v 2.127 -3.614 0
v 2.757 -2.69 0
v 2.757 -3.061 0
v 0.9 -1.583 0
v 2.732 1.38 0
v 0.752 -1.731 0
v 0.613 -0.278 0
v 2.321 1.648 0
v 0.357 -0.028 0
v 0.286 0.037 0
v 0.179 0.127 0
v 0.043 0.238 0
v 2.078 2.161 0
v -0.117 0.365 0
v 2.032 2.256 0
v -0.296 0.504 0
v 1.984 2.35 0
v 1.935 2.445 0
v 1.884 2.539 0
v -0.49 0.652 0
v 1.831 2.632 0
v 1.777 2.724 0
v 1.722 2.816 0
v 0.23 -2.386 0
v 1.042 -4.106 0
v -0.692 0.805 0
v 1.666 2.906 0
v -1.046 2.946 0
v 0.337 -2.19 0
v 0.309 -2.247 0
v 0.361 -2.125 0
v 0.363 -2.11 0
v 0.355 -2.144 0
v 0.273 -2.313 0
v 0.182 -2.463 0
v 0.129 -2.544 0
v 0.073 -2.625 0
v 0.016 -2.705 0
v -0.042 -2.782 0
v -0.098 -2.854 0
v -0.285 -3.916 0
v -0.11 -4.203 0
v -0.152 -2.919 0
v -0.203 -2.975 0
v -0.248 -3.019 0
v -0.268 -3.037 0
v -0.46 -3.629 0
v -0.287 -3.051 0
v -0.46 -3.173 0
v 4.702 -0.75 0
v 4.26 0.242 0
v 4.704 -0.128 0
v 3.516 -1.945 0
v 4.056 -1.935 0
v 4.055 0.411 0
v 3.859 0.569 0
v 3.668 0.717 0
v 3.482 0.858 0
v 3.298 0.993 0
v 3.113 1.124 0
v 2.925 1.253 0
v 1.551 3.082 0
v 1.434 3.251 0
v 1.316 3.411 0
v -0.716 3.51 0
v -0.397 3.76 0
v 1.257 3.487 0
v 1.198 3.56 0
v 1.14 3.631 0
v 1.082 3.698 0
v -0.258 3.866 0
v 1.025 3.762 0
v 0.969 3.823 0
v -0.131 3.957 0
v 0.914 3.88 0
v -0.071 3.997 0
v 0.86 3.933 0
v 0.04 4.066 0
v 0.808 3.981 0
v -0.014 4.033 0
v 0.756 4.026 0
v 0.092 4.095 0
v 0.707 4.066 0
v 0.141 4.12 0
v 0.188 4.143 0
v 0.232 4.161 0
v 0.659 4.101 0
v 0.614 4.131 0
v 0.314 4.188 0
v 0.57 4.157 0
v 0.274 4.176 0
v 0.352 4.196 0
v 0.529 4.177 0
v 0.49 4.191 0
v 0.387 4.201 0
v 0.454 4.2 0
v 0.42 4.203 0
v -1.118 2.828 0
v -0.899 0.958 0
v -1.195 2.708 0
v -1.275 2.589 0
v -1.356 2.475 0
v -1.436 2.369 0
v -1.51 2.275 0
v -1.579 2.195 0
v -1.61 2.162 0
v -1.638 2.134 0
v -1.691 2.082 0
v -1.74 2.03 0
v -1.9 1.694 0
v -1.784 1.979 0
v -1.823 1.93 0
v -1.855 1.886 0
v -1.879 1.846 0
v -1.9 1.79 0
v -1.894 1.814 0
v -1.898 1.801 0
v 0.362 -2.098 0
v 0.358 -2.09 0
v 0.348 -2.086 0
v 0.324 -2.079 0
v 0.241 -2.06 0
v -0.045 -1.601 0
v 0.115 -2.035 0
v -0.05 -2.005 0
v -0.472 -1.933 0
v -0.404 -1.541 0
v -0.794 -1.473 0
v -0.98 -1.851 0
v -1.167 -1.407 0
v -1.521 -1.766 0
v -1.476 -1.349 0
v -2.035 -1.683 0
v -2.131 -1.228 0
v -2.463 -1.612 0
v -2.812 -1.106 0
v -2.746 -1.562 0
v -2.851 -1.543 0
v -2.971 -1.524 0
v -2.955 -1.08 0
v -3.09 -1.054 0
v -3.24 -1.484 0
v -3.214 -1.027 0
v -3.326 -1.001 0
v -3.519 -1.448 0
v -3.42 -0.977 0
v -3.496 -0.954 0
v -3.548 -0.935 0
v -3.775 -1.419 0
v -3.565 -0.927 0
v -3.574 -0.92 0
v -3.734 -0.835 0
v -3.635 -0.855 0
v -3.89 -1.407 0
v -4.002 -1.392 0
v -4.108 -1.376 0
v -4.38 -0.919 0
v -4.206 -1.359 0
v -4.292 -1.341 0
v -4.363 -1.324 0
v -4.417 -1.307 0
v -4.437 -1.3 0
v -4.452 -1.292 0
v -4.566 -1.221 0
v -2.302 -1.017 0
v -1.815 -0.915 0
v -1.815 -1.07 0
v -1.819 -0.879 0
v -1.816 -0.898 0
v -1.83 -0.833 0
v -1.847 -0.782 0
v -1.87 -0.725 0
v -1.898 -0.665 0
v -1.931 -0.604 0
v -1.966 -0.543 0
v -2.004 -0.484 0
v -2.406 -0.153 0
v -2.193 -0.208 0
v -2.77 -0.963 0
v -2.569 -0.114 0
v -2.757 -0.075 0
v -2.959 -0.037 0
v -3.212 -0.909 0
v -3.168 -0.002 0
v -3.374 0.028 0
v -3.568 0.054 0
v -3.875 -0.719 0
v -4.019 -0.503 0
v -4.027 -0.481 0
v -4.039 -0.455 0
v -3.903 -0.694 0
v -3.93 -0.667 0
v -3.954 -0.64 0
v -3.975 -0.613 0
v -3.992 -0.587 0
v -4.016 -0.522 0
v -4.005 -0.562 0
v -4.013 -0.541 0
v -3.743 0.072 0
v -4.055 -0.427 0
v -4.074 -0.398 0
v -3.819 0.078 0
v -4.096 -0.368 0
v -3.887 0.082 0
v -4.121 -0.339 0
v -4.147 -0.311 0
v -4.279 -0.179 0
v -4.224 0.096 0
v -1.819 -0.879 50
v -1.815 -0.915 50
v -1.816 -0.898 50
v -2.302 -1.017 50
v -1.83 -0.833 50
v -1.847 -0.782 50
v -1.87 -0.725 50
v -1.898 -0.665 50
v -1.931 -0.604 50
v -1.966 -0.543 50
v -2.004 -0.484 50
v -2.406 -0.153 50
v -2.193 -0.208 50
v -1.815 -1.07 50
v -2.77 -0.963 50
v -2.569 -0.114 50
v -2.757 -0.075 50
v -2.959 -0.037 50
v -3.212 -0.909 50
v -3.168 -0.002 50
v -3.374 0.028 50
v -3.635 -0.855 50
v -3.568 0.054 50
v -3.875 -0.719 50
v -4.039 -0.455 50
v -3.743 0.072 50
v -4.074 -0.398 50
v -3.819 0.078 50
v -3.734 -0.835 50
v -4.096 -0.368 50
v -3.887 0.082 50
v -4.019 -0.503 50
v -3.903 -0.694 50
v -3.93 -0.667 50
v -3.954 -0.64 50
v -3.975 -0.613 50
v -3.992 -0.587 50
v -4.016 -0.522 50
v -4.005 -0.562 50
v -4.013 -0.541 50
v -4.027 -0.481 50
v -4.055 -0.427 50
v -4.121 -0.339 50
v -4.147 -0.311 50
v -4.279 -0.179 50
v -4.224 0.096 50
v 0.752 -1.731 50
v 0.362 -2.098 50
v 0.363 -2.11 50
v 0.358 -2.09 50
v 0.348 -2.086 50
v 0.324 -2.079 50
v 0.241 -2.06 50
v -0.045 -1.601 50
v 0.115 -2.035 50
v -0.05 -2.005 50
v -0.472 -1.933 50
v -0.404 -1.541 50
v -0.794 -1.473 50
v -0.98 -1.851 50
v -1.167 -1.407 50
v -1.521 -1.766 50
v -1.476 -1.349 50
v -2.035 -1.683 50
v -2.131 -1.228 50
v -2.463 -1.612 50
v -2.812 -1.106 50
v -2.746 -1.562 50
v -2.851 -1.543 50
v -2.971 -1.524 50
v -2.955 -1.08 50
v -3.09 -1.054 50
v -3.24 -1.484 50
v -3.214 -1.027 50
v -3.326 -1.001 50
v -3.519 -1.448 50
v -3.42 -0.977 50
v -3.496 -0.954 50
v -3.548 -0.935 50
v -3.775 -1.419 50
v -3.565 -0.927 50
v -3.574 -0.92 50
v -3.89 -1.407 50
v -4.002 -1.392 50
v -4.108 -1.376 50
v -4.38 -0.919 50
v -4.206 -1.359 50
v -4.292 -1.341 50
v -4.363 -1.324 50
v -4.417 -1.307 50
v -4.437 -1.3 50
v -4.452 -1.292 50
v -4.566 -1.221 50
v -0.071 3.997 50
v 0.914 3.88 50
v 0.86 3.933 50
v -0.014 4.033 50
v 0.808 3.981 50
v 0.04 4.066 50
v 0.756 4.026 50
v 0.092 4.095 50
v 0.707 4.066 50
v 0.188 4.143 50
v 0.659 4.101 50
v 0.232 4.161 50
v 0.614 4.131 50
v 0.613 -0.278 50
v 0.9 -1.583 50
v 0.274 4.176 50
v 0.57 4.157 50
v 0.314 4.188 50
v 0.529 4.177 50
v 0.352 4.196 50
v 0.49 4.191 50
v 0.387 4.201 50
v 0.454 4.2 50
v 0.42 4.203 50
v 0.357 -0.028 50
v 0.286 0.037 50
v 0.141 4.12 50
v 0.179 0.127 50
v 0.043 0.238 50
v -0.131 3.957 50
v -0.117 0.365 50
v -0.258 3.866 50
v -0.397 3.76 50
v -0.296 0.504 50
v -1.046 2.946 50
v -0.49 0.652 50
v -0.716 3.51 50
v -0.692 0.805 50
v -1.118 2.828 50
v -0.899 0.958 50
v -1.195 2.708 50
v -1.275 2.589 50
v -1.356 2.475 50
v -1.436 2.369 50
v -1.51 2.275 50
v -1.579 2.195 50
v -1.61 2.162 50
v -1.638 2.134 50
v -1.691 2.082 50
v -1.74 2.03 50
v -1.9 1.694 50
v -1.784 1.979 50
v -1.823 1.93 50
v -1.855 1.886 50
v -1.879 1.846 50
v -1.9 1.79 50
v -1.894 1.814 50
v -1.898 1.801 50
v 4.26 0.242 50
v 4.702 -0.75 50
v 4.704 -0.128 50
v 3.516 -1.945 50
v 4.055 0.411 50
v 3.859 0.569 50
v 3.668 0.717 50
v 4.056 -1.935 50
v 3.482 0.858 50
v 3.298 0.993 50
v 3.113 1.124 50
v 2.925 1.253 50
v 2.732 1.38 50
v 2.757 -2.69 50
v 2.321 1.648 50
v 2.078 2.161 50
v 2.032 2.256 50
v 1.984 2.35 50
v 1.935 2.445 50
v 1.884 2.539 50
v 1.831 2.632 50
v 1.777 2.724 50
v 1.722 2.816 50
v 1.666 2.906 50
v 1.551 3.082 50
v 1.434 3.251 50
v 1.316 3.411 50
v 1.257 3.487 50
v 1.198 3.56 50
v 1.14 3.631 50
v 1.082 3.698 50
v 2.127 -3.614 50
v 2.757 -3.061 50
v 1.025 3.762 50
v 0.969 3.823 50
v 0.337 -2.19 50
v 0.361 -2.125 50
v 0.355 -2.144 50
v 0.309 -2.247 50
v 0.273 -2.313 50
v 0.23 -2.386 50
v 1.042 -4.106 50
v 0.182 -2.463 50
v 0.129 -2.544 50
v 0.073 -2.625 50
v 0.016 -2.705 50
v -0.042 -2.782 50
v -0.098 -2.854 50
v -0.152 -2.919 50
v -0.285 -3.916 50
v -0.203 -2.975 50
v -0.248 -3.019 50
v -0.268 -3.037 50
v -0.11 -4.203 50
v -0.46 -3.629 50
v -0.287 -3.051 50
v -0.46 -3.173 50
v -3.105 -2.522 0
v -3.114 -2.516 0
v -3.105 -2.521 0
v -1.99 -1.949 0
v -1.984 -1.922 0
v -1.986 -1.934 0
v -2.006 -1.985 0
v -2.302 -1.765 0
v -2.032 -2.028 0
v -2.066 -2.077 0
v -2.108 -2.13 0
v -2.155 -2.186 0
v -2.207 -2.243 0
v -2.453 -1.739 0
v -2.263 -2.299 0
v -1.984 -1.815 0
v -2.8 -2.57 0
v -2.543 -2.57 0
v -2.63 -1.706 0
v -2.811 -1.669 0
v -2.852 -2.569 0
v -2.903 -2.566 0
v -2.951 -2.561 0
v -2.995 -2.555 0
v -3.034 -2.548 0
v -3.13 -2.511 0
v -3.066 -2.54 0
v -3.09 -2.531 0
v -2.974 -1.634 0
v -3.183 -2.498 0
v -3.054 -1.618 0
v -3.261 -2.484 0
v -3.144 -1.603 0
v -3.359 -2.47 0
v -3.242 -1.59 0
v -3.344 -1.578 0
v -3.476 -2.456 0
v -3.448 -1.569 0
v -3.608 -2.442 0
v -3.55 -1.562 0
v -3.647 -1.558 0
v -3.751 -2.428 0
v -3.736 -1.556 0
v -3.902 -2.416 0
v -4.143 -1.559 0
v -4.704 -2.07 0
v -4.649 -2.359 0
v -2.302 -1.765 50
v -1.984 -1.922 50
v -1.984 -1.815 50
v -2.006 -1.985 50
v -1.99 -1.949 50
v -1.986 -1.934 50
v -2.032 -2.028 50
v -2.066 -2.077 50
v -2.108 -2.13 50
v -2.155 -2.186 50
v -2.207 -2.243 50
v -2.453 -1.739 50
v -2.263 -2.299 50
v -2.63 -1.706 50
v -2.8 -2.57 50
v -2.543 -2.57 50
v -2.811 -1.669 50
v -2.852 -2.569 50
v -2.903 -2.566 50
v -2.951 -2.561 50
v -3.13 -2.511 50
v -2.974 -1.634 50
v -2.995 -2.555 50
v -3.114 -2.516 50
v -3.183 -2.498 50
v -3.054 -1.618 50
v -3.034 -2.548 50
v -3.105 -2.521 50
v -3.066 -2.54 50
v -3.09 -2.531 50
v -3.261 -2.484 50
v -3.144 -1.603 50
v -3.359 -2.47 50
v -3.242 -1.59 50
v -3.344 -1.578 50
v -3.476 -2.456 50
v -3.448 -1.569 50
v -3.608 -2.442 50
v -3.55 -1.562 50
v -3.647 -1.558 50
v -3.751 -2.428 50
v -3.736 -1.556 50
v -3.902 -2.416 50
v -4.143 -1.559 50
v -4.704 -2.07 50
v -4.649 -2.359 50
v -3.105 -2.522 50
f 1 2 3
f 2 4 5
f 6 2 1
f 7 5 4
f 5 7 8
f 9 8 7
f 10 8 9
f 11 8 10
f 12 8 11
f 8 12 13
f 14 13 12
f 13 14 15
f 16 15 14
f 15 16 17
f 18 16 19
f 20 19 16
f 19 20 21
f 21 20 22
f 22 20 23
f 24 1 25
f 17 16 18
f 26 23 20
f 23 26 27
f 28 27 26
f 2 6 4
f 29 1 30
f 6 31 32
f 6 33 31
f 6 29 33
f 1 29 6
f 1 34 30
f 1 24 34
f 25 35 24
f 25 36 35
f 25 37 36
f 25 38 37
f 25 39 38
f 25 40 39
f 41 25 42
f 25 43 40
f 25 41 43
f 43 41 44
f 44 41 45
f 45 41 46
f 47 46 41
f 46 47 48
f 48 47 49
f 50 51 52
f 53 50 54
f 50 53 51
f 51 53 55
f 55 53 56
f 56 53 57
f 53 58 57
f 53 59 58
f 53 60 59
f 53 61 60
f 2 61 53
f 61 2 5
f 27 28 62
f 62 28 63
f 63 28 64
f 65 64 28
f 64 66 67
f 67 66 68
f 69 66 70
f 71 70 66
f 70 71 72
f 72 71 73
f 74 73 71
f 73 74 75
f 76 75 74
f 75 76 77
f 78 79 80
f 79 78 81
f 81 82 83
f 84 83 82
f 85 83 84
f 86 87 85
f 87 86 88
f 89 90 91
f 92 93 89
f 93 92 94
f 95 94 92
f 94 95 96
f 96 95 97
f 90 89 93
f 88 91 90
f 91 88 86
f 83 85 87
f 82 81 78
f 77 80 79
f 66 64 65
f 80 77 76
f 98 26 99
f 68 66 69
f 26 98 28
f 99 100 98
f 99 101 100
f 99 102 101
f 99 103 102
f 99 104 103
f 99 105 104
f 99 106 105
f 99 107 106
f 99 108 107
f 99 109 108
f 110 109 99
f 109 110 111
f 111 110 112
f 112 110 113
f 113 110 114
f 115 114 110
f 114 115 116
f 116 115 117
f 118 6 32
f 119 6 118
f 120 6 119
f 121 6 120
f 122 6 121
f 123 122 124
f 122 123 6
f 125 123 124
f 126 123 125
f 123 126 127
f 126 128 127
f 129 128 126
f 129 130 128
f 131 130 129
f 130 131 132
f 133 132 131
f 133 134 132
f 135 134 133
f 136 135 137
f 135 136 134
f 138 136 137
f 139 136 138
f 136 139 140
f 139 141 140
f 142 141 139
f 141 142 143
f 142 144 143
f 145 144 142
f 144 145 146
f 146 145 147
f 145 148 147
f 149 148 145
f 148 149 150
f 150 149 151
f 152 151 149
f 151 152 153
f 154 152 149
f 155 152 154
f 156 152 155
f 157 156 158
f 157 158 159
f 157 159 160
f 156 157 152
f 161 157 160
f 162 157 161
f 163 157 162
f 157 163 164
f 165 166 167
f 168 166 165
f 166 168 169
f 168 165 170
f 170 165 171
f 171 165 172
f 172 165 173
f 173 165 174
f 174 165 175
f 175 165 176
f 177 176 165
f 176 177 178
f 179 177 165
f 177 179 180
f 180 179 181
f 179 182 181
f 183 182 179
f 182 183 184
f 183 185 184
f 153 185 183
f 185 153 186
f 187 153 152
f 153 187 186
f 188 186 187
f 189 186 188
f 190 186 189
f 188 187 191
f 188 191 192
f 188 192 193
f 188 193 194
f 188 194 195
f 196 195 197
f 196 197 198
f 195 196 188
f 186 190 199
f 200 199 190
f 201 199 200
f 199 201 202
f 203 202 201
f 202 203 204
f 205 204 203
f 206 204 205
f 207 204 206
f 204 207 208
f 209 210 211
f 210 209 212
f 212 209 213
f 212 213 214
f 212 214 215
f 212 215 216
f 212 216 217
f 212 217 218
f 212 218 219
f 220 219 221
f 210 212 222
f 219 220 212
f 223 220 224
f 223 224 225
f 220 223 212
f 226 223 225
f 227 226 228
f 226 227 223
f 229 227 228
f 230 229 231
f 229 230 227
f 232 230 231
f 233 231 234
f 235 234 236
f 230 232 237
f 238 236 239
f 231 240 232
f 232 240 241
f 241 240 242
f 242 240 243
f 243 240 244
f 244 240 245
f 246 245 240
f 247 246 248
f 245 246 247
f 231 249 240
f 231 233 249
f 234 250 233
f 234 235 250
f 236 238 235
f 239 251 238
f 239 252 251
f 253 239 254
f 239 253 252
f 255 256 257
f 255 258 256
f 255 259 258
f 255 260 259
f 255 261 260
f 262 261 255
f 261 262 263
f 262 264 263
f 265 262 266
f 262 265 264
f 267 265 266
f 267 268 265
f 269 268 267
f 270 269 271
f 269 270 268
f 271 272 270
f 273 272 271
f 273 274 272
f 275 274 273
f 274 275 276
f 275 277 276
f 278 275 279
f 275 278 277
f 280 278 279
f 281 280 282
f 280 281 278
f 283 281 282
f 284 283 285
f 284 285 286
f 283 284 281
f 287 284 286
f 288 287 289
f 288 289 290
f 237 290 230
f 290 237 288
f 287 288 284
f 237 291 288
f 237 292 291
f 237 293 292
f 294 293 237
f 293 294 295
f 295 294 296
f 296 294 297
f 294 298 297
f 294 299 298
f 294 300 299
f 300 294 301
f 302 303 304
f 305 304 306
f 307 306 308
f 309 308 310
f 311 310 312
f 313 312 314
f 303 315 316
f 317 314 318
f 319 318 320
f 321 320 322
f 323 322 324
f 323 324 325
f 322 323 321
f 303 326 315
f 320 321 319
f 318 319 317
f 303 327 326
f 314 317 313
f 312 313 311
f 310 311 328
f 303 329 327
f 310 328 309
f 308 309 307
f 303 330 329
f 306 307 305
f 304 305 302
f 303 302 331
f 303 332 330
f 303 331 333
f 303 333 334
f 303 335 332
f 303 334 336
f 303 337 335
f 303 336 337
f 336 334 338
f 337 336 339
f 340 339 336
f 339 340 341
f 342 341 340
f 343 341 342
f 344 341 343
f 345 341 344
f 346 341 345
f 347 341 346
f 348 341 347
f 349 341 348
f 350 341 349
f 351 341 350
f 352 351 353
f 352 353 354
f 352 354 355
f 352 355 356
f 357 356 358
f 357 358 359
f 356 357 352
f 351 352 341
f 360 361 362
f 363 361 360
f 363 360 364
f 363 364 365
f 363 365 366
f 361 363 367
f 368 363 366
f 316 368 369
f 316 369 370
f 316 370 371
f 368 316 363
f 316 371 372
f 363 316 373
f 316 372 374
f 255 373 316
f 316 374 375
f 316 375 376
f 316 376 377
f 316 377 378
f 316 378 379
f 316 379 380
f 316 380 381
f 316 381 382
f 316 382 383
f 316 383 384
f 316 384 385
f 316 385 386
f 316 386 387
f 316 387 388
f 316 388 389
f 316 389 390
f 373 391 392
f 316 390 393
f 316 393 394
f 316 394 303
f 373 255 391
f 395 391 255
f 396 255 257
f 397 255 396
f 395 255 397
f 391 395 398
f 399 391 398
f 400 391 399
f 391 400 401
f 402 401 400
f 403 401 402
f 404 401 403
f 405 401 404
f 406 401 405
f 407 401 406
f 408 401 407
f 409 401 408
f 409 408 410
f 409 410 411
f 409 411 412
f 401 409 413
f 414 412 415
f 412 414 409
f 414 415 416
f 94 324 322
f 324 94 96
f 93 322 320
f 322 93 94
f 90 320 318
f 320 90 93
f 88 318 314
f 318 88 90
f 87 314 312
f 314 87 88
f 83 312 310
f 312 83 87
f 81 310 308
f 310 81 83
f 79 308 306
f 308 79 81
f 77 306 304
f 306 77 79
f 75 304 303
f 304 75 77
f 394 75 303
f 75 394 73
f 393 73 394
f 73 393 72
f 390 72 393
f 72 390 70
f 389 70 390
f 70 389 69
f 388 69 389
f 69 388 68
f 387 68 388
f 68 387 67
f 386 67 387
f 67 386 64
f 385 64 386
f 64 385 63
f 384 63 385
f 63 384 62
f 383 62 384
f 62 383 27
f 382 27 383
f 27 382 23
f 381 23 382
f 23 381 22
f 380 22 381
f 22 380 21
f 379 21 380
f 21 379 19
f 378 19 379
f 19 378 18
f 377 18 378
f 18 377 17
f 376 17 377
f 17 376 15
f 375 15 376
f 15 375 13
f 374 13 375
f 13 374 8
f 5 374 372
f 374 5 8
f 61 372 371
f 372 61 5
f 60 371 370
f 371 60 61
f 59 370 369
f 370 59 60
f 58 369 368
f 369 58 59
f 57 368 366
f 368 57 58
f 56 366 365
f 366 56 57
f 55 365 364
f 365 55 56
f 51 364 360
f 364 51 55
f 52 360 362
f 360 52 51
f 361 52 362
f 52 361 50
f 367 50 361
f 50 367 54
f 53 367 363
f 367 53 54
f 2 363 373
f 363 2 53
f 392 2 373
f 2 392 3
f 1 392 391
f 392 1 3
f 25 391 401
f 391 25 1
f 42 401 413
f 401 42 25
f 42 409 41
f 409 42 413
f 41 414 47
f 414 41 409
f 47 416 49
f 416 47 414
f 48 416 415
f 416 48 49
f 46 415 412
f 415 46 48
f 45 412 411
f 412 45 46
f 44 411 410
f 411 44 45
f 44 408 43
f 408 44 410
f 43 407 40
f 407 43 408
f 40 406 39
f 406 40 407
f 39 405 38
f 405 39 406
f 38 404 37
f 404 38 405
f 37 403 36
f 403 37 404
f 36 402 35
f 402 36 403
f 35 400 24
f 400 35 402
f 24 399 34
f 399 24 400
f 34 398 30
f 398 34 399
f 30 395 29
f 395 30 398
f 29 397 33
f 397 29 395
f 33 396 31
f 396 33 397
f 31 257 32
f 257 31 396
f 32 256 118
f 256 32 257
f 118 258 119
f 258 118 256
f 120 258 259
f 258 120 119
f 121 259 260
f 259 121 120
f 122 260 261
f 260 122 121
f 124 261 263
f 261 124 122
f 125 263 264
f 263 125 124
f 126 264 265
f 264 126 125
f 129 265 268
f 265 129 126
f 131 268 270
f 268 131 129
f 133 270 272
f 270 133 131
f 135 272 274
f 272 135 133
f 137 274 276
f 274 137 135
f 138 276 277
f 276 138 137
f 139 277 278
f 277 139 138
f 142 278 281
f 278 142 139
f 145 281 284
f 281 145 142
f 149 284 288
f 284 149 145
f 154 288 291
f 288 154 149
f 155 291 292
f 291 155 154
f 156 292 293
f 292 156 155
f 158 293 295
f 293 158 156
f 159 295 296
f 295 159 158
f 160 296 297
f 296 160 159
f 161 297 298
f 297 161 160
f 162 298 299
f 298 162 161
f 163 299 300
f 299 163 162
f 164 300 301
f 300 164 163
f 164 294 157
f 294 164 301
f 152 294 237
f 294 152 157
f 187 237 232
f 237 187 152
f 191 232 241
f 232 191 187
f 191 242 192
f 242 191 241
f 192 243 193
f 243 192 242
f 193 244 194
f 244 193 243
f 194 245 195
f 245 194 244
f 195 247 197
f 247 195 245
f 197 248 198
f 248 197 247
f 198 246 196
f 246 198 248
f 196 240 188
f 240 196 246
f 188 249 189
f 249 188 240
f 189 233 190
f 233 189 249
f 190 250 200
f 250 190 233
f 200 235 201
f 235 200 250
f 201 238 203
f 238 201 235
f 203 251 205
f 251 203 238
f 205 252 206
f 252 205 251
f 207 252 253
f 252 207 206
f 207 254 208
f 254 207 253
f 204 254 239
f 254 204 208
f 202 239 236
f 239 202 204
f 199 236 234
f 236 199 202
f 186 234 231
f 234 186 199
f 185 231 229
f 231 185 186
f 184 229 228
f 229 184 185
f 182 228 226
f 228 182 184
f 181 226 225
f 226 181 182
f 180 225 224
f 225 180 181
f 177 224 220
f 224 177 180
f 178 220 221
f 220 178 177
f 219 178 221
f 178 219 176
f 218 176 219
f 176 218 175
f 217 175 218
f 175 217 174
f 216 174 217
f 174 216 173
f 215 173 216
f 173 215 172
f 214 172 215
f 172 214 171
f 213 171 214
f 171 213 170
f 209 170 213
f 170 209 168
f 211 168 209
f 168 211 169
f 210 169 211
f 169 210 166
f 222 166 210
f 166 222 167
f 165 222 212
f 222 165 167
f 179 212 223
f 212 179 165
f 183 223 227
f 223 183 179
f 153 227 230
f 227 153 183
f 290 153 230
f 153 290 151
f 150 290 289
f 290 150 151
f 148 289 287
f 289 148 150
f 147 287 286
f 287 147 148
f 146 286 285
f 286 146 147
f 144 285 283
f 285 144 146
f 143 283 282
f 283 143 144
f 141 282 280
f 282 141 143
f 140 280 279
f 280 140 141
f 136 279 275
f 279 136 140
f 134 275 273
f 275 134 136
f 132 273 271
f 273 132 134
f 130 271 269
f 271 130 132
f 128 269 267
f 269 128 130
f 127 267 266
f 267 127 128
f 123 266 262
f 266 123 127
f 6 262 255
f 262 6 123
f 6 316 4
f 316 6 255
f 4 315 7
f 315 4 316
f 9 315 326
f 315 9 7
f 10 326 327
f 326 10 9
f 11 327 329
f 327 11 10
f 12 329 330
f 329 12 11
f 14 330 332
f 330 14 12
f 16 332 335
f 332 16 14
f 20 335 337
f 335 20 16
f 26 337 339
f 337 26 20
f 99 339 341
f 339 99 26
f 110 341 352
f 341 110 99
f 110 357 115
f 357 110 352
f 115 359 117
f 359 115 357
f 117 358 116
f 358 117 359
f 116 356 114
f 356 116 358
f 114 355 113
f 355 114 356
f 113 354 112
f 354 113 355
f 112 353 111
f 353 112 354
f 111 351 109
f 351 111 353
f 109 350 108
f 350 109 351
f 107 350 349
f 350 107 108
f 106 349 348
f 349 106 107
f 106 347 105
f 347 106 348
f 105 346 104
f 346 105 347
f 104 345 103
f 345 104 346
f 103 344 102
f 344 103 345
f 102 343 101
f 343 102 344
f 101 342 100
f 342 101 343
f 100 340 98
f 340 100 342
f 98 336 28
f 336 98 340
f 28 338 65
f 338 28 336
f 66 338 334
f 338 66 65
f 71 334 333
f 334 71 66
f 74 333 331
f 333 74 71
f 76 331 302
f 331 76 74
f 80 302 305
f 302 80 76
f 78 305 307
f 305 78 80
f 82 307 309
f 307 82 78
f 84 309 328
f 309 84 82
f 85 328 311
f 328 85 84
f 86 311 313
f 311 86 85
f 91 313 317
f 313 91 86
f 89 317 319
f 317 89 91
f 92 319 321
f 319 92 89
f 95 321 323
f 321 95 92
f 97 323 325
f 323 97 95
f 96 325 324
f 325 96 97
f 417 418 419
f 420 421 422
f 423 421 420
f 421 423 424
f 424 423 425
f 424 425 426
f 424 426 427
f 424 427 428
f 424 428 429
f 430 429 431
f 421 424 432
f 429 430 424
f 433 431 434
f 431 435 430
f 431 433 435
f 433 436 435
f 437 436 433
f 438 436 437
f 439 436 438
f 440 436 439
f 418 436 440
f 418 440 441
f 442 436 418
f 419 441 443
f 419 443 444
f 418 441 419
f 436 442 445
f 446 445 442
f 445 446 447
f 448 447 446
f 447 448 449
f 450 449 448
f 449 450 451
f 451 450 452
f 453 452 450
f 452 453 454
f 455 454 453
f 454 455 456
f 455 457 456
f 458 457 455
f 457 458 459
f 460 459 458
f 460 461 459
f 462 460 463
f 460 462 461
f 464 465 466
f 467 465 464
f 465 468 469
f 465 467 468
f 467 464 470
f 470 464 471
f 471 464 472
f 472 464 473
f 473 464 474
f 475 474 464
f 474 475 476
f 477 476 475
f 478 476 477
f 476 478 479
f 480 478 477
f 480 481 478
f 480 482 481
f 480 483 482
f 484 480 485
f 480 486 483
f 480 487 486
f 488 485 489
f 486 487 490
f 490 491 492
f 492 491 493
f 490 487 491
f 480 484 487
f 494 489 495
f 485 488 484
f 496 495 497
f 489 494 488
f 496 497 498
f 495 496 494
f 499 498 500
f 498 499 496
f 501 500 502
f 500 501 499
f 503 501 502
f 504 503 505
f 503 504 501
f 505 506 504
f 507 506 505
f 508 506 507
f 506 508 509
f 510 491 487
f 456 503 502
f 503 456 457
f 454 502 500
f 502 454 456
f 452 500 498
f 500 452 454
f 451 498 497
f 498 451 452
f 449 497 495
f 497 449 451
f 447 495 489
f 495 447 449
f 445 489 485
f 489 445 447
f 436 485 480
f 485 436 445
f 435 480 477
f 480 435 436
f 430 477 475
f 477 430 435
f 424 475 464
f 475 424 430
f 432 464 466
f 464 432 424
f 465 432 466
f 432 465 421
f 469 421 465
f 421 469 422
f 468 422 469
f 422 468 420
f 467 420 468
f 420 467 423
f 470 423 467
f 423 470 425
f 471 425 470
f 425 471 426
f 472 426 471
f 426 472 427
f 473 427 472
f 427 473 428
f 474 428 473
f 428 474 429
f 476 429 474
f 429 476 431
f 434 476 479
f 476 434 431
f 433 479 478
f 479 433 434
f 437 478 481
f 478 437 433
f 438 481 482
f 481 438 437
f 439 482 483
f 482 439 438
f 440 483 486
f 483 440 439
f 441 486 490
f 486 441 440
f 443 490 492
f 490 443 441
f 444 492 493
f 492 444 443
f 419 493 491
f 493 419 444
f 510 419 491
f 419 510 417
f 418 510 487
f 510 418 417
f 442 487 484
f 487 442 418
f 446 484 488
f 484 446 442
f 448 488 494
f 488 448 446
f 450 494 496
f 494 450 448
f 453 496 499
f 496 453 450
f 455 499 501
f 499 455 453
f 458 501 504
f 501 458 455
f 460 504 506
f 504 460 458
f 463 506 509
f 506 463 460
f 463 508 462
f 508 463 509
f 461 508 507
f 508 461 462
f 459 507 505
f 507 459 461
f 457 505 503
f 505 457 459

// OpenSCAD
// Generated by inkscape None + inkscape-paths2openscad 0.27
// Sat Sep 26 10:30:30 2020 from "inkscape.svg"

// Module names are of the form poly_<inkscape-path-id>().  As a result,
// you can associate a polygon in this OpenSCAD program with the corresponding
// SVG element in the Inkscape document by looking for the XML element with
// the attribute id="inkscape-path-id".

// fudge value is used to ensure that subtracted solids are a tad taller
// in the z dimension than the polygon being subtracted from.  This helps
// keep the resulting .stl file manifold.
fudge = 0.1;
user_unit_scale_x = 1.0;
user_unit_scale_y = 1.0;
custom_scale_x = 1;
custom_scale_y = 1;
zsize = 50;
line_fn = 16;
min_line_width = 1.0;
line_width_scale = 1.0;
function min_line_mm(w) = max(min_line_width, w * line_width_scale) * 1;


path955_0_center = [0.068998,0.000000];
path955_0_points = [[-0.284593,3.915664],[-0.459532,3.628714],[-0.459848,3.400684],[-0.460165,3.172644],[-0.286974,3.051344],[-0.268334,3.037116],[-0.247942,3.019406],[-0.202564,2.974524],[-0.152163,2.918668],[-0.098063,2.853809],[-0.041586,2.781916],[0.015945,2.704960],[0.073207,2.624913],[0.128877,2.543744],[0.181631,2.463423],[0.230147,2.385922],[0.273102,2.313211],[0.309173,2.247261],[0.337037,2.190041],[0.355370,2.143523],[0.360549,2.124893],[0.362850,2.109677],[0.362107,2.098122],[0.358154,2.090474],[0.347634,2.085646],[0.324168,2.078895],[0.241138,2.060112],[0.114551,2.035106],[-0.050105,2.004857],[-0.471677,1.932553],[-0.979681,1.851044],[-1.521508,1.765611],[-2.035173,1.682634],[-2.462713,1.611596],[-2.746165,1.561984],[-2.851195,1.543424],[-2.971384,1.523907],[-3.240369,1.484340],[-3.519372,1.447946],[-3.774646,1.419394],[-3.890041,1.406688],[-4.002213,1.392020],[-4.108384,1.375910],[-4.205775,1.358880],[-4.291608,1.341451],[-4.363105,1.324144],[-4.417489,1.307481],[-4.437394,1.299554],[-4.451980,1.291984],[-4.566498,1.220584],[-4.473188,1.070014],[-4.379878,0.919434],[-4.057030,0.877134],[-3.734182,0.834834],[-3.875175,0.718634],[-3.903499,0.693654],[-3.929922,0.667179],[-3.953866,0.640014],[-3.974753,0.612967],[-3.992005,0.586844],[-4.005044,0.562451],[-4.013291,0.540595],[-4.016169,0.522084],[-4.018847,0.503262],[-4.026523,0.480528],[-4.038659,0.454746],[-4.054716,0.426786],[-4.074157,0.397514],[-4.096443,0.367798],[-4.121036,0.338505],[-4.147398,0.310504],[-4.278627,0.179284],[-4.251377,0.041394],[-4.224127,-0.096500],[-3.887312,-0.082230],[-3.819168,-0.078345],[-3.742577,-0.072192],[-3.568501,-0.053789],[-3.373984,-0.028436],[-3.167926,0.002453],[-2.959226,0.037463],[-2.756784,0.075181],[-2.569501,0.114193],[-2.406275,0.153084],[-2.193386,0.208184],[-2.004108,0.484414],[-1.966086,0.543061],[-1.930615,0.603876],[-1.898471,0.665092],[-1.870430,0.724942],[-1.847270,0.781659],[-1.829765,0.833474],[-1.818693,0.878622],[-1.815812,0.898142],[-1.814830,0.915334],[-1.814830,1.070024],[-2.301664,1.016924],[-2.769844,0.963375],[-3.211830,0.909234],[-3.635164,0.854634],[-3.574504,0.919534],[-3.564685,0.926777],[-3.548002,0.935058],[-3.495608,0.954347],[-3.420445,0.976634],[-3.325641,1.001156],[-3.214319,1.027147],[-3.089606,1.053842],[-2.954626,1.080476],[-2.812504,1.106284],[-2.130654,1.227912],[-1.476168,1.349234],[-1.166761,1.406537],[-0.793731,1.473047],[-0.404047,1.540516],[-0.044680,1.600694],[0.751807,1.731074],[0.825767,1.657074],[0.899727,1.583074],[0.756289,0.930294],[0.612851,0.277513],[0.357490,0.027853],[0.285766,-0.037323],[0.179367,-0.127169],[0.043445,-0.237640],[-0.116849,-0.364695],[-0.296362,-0.504290],[-0.489941,-0.652382],[-0.692434,-0.804928],[-0.898689,-0.957886],[-1.899507,-1.693959],[-1.899507,-1.789579],[-1.898151,-1.800609],[-1.894171,-1.813862],[-1.878879,-1.846328],[-1.854702,-1.885565],[-1.822712,-1.930160],[-1.783983,-1.978701],[-1.739586,-2.029776],[-1.690594,-2.081972],[-1.638079,-2.133876],[-1.609734,-2.162133],[-1.578819,-2.195337],[-1.510497,-2.274917],[-1.435539,-2.369285],[-1.356374,-2.475109],[-1.275430,-2.589056],[-1.195133,-2.707795],[-1.117912,-2.827992],[-1.046195,-2.946316],[-0.715738,-3.510082],[-0.397456,-3.759565],[-0.258376,-3.865631],[-0.130805,-3.956695],[-0.071182,-3.996685],[-0.014252,-4.033023],[0.040044,-4.065744],[0.091769,-4.094879],[0.140983,-4.120463],[0.187747,-4.142528],[0.232123,-4.161108],[0.274172,-4.176236],[0.313954,-4.187944],[0.351531,-4.196266],[0.386964,-4.201235],[0.420314,-4.202883],[0.453802,-4.199890],[0.490042,-4.191040],[0.528876,-4.176525],[0.570148,-4.156540],[0.613700,-4.131278],[0.659375,-4.100932],[0.707017,-4.065696],[0.756469,-4.025762],[0.807573,-3.981326],[0.860172,-3.932579],[0.914109,-3.879716],[0.969227,-3.822929],[1.025370,-3.762413],[1.082380,-3.698361],[1.140101,-3.630965],[1.198374,-3.560420],[1.257044,-3.486919],[1.315952,-3.410655],[1.433859,-3.250613],[1.550838,-3.081841],[1.665632,-2.905887],[1.721818,-2.815700],[1.776987,-2.724297],[1.830981,-2.631873],[1.883644,-2.538621],[1.934820,-2.444733],[1.984350,-2.350404],[2.032077,-2.255826],[2.077846,-2.161193],[2.320654,-1.647775],[2.731826,-1.380162],[2.924863,-1.252529],[3.112760,-1.124112],[3.297798,-0.993210],[3.482260,-0.858123],[3.668428,-0.717151],[3.858585,-0.568595],[4.055012,-0.410755],[4.259993,-0.241929],[4.704493,0.128214],[4.703193,0.439164],[4.701893,0.750114],[4.378924,1.342784],[4.055954,1.935454],[3.786148,1.940454],[3.516342,1.945453],[3.136764,2.317973],[2.757186,2.690503],[2.757186,2.875773],[2.757186,3.061043],[2.442255,3.337553],[2.127323,3.614064],[1.584540,3.860174],[1.041757,4.106284],[0.466060,4.154584],[-0.109637,4.202883],[-0.284576,3.915933],[-0.284593,3.915664]];
path955_1_center = [-3.344334,2.063084];
path955_1_points = [[-3.105436,2.521554],[-3.114287,2.516276],[-3.130499,2.510568],[-3.183374,2.498075],[-3.260793,2.484507],[-3.359492,2.470299],[-3.476203,2.455882],[-3.607660,2.441690],[-3.750597,2.428156],[-3.901748,2.415714],[-4.649233,2.358714],[-4.676863,2.214264],[-4.704493,2.069814],[-4.423833,1.814584],[-4.143174,1.559354],[-3.736166,1.556354],[-3.647161,1.557596],[-3.550121,1.561871],[-3.448171,1.568871],[-3.344437,1.578291],[-3.242044,1.589825],[-3.144118,1.603168],[-3.053783,1.618012],[-2.974166,1.634054],[-2.811276,1.669185],[-2.630187,1.705566],[-2.452964,1.738898],[-2.301674,1.764884],[-1.984174,1.815484],[-1.984174,1.922044],[-1.985622,1.934301],[-1.989872,1.948970],[-2.006204,1.984767],[-2.032024,2.027889],[-2.066188,2.076787],[-2.107549,2.129915],[-2.154964,2.185725],[-2.207286,2.242670],[-2.263371,2.299204],[-2.542568,2.569814],[-2.799593,2.569814],[-2.852221,2.568816],[-2.903244,2.565957],[-2.951408,2.561439],[-2.995460,2.555464],[-3.034144,2.548231],[-3.066205,2.539945],[-3.090391,2.530805],[-3.105445,2.521014],[-3.105436,2.521554]];
module poly_path955(h, w, s, res=line_fn)
{
  scale([custom_scale_x, -custom_scale_y, 1]) union()
  {
    translate (path955_0_center) linear_extrude(height=h, convexity=10, scale=0.01*s)
      translate (-path955_0_center) polygon(path955_0_points);
    translate (path955_1_center) linear_extrude(height=h, convexity=10, scale=0.01*s)
      translate (-path955_1_center) polygon(path955_1_points);
  }
}

module immobilize(h)
{
  difference()
  {
    union()
    {
      translate ([0,0,0]) poly_path955(h, min_line_mm(0.999998), 100.0);
    }
    union()
    {
    }
  }
}

immobilize(zsize);
